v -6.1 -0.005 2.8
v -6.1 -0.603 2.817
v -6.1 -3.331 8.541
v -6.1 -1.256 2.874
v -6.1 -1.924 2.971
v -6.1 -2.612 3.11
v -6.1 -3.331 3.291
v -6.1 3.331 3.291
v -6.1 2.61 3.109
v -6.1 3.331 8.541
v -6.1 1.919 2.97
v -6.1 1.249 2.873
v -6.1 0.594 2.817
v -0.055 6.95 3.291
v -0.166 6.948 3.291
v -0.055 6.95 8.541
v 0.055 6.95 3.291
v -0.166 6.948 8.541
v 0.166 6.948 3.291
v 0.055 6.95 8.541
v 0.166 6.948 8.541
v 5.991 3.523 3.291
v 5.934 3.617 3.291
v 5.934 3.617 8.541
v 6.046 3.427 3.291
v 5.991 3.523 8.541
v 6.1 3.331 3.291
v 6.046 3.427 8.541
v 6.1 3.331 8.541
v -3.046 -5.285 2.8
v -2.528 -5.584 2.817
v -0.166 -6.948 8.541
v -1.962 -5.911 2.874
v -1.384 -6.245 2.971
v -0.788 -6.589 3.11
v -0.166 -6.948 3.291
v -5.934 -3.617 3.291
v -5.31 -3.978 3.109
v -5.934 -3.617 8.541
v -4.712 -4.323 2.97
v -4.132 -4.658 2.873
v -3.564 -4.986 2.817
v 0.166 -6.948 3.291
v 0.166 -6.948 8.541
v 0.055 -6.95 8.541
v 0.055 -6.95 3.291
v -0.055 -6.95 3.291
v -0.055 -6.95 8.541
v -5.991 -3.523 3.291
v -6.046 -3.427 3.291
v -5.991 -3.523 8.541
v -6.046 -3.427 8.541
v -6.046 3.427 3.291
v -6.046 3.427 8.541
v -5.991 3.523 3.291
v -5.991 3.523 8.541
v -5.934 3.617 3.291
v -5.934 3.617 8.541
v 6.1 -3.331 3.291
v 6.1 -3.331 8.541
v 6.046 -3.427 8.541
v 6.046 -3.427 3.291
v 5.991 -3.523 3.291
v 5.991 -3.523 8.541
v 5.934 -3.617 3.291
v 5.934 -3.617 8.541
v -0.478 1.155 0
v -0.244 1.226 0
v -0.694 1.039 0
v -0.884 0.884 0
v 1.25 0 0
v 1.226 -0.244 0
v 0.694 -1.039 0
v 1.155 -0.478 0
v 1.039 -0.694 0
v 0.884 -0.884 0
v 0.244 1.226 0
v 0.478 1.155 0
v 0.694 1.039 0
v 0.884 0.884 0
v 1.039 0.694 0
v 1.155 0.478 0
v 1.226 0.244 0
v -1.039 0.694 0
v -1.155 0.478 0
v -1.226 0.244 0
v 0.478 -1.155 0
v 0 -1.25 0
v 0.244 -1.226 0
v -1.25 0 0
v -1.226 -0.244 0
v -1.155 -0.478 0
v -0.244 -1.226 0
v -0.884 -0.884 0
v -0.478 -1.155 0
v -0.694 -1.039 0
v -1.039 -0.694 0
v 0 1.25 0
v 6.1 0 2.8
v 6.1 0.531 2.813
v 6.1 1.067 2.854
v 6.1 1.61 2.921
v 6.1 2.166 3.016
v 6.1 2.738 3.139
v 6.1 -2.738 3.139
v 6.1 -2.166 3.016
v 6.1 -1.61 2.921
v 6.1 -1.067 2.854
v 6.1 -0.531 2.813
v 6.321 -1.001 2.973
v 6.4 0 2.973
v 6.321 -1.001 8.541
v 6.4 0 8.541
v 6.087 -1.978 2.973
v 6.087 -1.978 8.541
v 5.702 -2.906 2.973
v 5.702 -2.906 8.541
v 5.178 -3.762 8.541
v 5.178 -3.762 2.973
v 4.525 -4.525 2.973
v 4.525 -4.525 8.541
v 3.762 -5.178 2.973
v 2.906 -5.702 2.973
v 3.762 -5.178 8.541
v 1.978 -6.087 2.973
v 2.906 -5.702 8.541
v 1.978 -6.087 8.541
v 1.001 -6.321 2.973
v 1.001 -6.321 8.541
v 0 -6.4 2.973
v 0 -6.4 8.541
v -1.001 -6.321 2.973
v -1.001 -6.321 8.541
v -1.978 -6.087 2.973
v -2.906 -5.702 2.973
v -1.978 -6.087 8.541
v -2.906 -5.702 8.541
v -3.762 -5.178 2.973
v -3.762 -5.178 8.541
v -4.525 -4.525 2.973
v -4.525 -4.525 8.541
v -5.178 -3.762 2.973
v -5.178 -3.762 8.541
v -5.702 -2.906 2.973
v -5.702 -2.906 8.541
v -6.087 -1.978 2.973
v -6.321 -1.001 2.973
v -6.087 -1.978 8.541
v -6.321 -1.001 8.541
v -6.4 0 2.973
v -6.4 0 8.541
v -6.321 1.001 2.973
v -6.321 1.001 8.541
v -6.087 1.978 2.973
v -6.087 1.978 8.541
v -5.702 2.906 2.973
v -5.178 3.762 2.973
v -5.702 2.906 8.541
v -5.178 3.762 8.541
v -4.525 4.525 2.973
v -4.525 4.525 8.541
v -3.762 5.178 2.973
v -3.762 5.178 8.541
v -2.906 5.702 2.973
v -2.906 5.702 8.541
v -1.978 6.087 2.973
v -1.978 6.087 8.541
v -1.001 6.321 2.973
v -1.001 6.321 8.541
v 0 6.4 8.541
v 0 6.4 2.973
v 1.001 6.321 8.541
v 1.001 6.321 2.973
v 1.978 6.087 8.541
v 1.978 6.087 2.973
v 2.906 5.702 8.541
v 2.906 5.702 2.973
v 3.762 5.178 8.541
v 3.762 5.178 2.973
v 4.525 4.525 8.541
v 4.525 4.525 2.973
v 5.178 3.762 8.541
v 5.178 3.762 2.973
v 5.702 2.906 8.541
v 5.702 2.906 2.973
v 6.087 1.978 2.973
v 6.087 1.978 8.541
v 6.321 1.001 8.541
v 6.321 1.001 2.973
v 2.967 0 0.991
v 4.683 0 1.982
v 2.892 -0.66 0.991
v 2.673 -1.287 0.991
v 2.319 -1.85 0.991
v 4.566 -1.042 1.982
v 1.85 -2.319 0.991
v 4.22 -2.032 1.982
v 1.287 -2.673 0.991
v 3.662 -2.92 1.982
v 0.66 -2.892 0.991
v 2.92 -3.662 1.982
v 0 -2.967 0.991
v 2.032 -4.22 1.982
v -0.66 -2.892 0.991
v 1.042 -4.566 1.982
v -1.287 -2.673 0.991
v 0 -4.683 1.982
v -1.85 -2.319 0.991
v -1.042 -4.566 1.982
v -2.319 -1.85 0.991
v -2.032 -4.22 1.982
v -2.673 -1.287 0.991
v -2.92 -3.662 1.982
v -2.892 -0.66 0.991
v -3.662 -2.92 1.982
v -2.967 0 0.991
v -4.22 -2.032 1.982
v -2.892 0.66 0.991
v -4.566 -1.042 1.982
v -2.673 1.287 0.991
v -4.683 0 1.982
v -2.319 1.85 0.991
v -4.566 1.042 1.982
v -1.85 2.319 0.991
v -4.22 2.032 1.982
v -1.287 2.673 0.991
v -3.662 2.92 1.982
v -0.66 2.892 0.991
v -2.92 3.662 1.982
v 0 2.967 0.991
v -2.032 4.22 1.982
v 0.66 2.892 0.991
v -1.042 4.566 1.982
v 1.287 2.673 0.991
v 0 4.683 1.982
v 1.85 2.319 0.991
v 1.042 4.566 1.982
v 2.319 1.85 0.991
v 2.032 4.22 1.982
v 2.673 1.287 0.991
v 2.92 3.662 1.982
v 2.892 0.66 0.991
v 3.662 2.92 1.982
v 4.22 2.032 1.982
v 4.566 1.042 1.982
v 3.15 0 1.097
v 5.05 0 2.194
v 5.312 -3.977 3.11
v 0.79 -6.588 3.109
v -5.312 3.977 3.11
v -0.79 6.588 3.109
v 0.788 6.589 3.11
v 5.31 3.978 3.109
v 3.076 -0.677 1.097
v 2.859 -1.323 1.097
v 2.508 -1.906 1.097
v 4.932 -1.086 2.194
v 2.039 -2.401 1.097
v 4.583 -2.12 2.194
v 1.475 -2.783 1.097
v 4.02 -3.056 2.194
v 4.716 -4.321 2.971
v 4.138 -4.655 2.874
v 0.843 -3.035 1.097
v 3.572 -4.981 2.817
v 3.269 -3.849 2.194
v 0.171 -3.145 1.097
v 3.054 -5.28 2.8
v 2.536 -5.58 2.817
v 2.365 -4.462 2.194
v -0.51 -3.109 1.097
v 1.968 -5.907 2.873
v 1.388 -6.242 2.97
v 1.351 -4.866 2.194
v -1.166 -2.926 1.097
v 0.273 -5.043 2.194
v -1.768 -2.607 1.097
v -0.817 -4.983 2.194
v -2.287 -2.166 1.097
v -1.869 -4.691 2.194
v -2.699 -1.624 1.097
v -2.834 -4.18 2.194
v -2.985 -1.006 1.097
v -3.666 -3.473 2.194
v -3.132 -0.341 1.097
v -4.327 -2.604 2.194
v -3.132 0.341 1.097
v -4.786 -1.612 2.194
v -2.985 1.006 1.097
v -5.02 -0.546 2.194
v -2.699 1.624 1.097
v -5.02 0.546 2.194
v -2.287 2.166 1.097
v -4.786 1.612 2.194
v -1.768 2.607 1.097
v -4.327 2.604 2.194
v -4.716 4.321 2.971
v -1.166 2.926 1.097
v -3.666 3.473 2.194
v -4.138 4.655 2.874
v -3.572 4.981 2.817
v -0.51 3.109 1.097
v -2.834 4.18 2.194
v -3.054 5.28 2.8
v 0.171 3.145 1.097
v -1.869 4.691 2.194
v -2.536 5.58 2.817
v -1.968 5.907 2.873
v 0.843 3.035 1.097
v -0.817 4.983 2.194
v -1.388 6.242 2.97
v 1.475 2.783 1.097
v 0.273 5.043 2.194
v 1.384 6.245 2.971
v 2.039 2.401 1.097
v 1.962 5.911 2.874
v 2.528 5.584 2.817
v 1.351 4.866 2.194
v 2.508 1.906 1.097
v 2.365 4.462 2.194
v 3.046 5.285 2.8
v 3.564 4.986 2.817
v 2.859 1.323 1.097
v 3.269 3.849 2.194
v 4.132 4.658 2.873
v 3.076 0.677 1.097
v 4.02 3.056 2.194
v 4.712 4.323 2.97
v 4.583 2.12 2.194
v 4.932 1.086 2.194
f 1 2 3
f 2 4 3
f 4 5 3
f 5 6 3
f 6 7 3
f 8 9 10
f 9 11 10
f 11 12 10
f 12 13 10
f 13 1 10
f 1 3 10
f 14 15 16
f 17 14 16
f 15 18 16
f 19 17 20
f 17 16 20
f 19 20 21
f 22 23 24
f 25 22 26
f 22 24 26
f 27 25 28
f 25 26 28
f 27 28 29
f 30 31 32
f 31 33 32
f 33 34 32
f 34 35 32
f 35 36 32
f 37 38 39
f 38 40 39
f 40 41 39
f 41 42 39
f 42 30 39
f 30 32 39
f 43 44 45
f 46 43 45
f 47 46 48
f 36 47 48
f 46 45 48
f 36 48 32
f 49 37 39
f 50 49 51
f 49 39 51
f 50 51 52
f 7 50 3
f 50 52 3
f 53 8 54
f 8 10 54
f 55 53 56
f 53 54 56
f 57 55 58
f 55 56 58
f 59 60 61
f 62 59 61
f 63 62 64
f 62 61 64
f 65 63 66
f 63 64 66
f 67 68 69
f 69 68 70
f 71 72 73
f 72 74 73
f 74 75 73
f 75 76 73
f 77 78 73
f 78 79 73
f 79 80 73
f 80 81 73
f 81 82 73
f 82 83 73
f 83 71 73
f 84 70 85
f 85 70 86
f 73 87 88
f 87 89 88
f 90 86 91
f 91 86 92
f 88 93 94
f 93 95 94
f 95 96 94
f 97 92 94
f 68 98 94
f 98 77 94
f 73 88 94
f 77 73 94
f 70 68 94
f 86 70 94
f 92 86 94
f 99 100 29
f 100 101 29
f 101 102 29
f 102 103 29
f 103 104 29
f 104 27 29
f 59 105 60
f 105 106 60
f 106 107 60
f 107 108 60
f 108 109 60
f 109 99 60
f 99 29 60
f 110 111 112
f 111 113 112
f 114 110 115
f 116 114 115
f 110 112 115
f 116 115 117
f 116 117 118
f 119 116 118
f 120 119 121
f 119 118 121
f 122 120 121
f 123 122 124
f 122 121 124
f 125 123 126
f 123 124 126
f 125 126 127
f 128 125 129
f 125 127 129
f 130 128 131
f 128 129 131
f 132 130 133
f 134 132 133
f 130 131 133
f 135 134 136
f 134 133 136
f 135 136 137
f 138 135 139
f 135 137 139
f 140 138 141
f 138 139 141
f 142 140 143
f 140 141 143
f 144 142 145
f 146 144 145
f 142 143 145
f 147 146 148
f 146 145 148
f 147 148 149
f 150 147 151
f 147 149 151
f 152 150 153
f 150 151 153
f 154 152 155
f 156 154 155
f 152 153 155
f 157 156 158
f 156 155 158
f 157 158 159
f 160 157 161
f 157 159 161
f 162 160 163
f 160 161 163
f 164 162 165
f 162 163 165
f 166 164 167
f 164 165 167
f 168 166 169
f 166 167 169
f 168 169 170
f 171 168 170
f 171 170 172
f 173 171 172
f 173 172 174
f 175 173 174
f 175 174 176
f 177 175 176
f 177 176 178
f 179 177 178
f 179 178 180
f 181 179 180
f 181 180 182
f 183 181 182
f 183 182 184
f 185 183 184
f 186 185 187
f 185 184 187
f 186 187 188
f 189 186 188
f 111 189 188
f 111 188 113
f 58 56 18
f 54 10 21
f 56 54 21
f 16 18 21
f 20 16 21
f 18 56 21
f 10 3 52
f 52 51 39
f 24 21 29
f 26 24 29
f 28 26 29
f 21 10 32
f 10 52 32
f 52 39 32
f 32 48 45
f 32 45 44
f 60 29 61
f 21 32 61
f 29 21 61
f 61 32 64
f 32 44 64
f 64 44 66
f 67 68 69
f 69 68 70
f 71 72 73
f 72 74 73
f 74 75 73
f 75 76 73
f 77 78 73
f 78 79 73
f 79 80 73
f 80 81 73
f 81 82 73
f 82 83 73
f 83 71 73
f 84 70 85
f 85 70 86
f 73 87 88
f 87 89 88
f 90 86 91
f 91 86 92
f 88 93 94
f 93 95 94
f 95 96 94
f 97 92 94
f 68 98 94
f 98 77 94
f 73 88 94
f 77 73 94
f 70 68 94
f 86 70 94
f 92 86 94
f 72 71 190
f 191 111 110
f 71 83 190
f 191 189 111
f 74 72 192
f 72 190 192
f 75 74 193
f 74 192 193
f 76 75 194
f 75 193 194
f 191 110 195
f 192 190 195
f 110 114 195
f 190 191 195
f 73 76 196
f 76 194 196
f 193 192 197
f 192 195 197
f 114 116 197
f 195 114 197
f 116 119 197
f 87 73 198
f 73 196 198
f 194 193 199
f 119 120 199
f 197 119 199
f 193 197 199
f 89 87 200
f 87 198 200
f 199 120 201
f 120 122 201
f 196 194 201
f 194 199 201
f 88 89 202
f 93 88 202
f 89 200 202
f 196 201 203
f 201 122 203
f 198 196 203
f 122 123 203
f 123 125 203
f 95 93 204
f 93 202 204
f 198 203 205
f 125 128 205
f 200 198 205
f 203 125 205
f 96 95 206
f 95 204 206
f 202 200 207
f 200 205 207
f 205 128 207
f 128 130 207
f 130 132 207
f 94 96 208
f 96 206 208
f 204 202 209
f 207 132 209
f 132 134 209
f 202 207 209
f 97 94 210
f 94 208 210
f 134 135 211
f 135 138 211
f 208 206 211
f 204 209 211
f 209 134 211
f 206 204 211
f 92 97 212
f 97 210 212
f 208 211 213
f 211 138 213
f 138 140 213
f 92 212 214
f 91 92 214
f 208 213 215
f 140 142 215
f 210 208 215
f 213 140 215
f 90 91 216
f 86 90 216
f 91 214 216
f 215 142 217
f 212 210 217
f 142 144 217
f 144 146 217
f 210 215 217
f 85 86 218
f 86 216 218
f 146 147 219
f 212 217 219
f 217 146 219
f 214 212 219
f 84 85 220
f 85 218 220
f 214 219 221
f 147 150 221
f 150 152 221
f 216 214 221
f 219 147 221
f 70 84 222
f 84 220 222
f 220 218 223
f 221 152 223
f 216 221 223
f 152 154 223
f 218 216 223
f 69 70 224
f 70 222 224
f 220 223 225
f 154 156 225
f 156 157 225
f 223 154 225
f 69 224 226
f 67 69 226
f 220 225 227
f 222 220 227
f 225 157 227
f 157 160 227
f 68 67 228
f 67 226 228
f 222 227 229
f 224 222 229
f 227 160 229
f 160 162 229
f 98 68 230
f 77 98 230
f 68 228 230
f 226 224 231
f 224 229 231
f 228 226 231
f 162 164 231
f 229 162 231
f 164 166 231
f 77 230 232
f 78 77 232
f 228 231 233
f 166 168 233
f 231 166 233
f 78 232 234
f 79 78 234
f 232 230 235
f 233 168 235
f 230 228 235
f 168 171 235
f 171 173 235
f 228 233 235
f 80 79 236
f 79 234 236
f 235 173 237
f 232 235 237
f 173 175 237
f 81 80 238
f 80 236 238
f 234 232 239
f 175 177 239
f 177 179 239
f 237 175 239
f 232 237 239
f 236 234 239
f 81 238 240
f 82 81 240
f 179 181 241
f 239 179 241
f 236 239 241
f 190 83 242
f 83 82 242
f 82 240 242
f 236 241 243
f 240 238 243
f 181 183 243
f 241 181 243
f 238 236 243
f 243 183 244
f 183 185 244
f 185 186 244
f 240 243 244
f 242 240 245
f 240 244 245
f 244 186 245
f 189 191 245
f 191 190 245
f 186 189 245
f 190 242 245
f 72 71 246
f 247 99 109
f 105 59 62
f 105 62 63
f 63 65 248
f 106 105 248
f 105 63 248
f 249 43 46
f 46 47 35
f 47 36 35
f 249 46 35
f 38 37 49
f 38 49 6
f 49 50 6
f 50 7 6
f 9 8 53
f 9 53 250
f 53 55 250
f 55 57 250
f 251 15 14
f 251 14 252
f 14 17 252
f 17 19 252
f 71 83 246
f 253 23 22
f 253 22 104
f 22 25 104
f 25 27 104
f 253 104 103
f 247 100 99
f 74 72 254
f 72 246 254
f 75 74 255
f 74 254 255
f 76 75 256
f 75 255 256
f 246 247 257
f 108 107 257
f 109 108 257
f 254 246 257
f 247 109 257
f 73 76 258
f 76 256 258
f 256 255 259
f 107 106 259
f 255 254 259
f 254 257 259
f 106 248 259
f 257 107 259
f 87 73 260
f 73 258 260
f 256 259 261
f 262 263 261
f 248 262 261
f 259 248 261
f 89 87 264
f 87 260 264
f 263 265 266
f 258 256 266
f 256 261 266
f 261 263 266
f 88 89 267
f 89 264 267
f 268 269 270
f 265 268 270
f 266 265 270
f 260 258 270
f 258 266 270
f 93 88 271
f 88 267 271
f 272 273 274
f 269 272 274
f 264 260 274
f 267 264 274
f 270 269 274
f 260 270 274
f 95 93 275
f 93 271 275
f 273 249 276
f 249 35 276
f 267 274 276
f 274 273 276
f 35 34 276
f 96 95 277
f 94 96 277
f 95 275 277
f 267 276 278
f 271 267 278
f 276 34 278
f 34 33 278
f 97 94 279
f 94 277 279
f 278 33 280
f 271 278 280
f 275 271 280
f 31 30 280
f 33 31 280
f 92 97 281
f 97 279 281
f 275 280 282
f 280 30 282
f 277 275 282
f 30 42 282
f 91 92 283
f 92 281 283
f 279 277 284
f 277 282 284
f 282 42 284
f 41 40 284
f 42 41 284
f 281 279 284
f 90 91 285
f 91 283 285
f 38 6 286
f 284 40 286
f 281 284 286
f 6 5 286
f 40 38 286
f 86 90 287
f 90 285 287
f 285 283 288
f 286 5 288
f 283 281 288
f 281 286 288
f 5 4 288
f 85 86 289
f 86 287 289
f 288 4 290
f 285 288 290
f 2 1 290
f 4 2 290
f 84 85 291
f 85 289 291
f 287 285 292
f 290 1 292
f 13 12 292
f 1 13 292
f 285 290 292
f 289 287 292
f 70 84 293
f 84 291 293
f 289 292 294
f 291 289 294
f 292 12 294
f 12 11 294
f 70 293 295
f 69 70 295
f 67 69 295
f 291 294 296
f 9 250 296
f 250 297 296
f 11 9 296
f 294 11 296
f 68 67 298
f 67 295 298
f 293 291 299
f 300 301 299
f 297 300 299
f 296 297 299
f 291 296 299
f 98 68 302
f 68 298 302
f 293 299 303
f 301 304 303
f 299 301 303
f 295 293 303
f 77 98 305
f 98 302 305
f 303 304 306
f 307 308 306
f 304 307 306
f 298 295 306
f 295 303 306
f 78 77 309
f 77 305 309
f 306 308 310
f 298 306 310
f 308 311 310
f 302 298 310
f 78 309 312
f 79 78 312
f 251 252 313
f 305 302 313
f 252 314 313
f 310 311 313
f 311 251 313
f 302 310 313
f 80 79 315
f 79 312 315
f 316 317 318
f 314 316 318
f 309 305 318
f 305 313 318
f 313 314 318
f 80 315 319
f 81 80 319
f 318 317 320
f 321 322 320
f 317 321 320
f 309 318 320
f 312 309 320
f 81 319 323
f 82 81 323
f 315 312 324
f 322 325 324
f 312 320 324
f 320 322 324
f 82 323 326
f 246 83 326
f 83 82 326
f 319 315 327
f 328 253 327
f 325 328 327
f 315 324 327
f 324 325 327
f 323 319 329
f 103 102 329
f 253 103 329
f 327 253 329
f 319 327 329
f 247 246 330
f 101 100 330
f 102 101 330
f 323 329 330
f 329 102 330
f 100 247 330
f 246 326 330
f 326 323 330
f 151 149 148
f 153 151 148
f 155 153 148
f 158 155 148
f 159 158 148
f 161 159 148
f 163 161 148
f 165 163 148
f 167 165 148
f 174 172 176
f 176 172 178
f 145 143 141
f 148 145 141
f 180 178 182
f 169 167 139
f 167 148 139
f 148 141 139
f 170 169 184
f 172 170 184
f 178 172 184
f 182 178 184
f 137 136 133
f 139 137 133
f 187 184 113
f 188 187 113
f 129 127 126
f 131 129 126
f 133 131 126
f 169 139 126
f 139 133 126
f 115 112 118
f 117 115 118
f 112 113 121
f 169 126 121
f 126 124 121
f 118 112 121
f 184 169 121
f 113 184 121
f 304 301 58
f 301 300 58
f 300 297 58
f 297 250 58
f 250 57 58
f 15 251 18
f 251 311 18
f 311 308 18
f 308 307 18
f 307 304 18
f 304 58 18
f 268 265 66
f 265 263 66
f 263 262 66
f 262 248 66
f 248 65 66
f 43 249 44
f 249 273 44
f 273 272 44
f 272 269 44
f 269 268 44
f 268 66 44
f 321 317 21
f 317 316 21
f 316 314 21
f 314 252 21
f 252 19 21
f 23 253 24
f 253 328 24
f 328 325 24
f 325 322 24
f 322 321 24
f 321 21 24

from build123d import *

# Parameters (mm, degrees)
F2_R     = 10.505318
F3_DEPTH = 25


with BuildPart() as f1:
    # F0 (on Front) → F1 (revolve)
    with BuildSketch(Plane.XZ):
        Polygon((0, 8.540897), (0, 0), (1.25, 0), (6.95, 3.290897), (6.95, 8.540897), align=None)
    revolve(axis=Axis((0, 0, 4.270448), (0, 0, -1)))

    # F2 (on face) → F3 (cut)
    with BuildSketch(Plane.XY.offset(8.540897)):
        Circle(F2_R)
        Polygon((0, 7.043673), (6.1, 3.521837), (6.1, -3.521837), (0, -7.043673), (-6.1, -3.521837), (-6.1, 3.521837), align=None, mode=Mode.SUBTRACT)
    extrude(amount=-F3_DEPTH, mode=Mode.SUBTRACT)


with BuildPart() as f5:
    # F4 (on Front) → F5 (revolve)
    with BuildSketch(Plane.XZ):
        Polygon((0, 8.541), (0, 0), (1.25, 0), (6.4, 2.973354), (6.4, 8.541), align=None)
    revolve(axis=Axis((0, 0, 4.2705), (0, 0, -1)))


solid = Compound([f1.part, f5.part])
